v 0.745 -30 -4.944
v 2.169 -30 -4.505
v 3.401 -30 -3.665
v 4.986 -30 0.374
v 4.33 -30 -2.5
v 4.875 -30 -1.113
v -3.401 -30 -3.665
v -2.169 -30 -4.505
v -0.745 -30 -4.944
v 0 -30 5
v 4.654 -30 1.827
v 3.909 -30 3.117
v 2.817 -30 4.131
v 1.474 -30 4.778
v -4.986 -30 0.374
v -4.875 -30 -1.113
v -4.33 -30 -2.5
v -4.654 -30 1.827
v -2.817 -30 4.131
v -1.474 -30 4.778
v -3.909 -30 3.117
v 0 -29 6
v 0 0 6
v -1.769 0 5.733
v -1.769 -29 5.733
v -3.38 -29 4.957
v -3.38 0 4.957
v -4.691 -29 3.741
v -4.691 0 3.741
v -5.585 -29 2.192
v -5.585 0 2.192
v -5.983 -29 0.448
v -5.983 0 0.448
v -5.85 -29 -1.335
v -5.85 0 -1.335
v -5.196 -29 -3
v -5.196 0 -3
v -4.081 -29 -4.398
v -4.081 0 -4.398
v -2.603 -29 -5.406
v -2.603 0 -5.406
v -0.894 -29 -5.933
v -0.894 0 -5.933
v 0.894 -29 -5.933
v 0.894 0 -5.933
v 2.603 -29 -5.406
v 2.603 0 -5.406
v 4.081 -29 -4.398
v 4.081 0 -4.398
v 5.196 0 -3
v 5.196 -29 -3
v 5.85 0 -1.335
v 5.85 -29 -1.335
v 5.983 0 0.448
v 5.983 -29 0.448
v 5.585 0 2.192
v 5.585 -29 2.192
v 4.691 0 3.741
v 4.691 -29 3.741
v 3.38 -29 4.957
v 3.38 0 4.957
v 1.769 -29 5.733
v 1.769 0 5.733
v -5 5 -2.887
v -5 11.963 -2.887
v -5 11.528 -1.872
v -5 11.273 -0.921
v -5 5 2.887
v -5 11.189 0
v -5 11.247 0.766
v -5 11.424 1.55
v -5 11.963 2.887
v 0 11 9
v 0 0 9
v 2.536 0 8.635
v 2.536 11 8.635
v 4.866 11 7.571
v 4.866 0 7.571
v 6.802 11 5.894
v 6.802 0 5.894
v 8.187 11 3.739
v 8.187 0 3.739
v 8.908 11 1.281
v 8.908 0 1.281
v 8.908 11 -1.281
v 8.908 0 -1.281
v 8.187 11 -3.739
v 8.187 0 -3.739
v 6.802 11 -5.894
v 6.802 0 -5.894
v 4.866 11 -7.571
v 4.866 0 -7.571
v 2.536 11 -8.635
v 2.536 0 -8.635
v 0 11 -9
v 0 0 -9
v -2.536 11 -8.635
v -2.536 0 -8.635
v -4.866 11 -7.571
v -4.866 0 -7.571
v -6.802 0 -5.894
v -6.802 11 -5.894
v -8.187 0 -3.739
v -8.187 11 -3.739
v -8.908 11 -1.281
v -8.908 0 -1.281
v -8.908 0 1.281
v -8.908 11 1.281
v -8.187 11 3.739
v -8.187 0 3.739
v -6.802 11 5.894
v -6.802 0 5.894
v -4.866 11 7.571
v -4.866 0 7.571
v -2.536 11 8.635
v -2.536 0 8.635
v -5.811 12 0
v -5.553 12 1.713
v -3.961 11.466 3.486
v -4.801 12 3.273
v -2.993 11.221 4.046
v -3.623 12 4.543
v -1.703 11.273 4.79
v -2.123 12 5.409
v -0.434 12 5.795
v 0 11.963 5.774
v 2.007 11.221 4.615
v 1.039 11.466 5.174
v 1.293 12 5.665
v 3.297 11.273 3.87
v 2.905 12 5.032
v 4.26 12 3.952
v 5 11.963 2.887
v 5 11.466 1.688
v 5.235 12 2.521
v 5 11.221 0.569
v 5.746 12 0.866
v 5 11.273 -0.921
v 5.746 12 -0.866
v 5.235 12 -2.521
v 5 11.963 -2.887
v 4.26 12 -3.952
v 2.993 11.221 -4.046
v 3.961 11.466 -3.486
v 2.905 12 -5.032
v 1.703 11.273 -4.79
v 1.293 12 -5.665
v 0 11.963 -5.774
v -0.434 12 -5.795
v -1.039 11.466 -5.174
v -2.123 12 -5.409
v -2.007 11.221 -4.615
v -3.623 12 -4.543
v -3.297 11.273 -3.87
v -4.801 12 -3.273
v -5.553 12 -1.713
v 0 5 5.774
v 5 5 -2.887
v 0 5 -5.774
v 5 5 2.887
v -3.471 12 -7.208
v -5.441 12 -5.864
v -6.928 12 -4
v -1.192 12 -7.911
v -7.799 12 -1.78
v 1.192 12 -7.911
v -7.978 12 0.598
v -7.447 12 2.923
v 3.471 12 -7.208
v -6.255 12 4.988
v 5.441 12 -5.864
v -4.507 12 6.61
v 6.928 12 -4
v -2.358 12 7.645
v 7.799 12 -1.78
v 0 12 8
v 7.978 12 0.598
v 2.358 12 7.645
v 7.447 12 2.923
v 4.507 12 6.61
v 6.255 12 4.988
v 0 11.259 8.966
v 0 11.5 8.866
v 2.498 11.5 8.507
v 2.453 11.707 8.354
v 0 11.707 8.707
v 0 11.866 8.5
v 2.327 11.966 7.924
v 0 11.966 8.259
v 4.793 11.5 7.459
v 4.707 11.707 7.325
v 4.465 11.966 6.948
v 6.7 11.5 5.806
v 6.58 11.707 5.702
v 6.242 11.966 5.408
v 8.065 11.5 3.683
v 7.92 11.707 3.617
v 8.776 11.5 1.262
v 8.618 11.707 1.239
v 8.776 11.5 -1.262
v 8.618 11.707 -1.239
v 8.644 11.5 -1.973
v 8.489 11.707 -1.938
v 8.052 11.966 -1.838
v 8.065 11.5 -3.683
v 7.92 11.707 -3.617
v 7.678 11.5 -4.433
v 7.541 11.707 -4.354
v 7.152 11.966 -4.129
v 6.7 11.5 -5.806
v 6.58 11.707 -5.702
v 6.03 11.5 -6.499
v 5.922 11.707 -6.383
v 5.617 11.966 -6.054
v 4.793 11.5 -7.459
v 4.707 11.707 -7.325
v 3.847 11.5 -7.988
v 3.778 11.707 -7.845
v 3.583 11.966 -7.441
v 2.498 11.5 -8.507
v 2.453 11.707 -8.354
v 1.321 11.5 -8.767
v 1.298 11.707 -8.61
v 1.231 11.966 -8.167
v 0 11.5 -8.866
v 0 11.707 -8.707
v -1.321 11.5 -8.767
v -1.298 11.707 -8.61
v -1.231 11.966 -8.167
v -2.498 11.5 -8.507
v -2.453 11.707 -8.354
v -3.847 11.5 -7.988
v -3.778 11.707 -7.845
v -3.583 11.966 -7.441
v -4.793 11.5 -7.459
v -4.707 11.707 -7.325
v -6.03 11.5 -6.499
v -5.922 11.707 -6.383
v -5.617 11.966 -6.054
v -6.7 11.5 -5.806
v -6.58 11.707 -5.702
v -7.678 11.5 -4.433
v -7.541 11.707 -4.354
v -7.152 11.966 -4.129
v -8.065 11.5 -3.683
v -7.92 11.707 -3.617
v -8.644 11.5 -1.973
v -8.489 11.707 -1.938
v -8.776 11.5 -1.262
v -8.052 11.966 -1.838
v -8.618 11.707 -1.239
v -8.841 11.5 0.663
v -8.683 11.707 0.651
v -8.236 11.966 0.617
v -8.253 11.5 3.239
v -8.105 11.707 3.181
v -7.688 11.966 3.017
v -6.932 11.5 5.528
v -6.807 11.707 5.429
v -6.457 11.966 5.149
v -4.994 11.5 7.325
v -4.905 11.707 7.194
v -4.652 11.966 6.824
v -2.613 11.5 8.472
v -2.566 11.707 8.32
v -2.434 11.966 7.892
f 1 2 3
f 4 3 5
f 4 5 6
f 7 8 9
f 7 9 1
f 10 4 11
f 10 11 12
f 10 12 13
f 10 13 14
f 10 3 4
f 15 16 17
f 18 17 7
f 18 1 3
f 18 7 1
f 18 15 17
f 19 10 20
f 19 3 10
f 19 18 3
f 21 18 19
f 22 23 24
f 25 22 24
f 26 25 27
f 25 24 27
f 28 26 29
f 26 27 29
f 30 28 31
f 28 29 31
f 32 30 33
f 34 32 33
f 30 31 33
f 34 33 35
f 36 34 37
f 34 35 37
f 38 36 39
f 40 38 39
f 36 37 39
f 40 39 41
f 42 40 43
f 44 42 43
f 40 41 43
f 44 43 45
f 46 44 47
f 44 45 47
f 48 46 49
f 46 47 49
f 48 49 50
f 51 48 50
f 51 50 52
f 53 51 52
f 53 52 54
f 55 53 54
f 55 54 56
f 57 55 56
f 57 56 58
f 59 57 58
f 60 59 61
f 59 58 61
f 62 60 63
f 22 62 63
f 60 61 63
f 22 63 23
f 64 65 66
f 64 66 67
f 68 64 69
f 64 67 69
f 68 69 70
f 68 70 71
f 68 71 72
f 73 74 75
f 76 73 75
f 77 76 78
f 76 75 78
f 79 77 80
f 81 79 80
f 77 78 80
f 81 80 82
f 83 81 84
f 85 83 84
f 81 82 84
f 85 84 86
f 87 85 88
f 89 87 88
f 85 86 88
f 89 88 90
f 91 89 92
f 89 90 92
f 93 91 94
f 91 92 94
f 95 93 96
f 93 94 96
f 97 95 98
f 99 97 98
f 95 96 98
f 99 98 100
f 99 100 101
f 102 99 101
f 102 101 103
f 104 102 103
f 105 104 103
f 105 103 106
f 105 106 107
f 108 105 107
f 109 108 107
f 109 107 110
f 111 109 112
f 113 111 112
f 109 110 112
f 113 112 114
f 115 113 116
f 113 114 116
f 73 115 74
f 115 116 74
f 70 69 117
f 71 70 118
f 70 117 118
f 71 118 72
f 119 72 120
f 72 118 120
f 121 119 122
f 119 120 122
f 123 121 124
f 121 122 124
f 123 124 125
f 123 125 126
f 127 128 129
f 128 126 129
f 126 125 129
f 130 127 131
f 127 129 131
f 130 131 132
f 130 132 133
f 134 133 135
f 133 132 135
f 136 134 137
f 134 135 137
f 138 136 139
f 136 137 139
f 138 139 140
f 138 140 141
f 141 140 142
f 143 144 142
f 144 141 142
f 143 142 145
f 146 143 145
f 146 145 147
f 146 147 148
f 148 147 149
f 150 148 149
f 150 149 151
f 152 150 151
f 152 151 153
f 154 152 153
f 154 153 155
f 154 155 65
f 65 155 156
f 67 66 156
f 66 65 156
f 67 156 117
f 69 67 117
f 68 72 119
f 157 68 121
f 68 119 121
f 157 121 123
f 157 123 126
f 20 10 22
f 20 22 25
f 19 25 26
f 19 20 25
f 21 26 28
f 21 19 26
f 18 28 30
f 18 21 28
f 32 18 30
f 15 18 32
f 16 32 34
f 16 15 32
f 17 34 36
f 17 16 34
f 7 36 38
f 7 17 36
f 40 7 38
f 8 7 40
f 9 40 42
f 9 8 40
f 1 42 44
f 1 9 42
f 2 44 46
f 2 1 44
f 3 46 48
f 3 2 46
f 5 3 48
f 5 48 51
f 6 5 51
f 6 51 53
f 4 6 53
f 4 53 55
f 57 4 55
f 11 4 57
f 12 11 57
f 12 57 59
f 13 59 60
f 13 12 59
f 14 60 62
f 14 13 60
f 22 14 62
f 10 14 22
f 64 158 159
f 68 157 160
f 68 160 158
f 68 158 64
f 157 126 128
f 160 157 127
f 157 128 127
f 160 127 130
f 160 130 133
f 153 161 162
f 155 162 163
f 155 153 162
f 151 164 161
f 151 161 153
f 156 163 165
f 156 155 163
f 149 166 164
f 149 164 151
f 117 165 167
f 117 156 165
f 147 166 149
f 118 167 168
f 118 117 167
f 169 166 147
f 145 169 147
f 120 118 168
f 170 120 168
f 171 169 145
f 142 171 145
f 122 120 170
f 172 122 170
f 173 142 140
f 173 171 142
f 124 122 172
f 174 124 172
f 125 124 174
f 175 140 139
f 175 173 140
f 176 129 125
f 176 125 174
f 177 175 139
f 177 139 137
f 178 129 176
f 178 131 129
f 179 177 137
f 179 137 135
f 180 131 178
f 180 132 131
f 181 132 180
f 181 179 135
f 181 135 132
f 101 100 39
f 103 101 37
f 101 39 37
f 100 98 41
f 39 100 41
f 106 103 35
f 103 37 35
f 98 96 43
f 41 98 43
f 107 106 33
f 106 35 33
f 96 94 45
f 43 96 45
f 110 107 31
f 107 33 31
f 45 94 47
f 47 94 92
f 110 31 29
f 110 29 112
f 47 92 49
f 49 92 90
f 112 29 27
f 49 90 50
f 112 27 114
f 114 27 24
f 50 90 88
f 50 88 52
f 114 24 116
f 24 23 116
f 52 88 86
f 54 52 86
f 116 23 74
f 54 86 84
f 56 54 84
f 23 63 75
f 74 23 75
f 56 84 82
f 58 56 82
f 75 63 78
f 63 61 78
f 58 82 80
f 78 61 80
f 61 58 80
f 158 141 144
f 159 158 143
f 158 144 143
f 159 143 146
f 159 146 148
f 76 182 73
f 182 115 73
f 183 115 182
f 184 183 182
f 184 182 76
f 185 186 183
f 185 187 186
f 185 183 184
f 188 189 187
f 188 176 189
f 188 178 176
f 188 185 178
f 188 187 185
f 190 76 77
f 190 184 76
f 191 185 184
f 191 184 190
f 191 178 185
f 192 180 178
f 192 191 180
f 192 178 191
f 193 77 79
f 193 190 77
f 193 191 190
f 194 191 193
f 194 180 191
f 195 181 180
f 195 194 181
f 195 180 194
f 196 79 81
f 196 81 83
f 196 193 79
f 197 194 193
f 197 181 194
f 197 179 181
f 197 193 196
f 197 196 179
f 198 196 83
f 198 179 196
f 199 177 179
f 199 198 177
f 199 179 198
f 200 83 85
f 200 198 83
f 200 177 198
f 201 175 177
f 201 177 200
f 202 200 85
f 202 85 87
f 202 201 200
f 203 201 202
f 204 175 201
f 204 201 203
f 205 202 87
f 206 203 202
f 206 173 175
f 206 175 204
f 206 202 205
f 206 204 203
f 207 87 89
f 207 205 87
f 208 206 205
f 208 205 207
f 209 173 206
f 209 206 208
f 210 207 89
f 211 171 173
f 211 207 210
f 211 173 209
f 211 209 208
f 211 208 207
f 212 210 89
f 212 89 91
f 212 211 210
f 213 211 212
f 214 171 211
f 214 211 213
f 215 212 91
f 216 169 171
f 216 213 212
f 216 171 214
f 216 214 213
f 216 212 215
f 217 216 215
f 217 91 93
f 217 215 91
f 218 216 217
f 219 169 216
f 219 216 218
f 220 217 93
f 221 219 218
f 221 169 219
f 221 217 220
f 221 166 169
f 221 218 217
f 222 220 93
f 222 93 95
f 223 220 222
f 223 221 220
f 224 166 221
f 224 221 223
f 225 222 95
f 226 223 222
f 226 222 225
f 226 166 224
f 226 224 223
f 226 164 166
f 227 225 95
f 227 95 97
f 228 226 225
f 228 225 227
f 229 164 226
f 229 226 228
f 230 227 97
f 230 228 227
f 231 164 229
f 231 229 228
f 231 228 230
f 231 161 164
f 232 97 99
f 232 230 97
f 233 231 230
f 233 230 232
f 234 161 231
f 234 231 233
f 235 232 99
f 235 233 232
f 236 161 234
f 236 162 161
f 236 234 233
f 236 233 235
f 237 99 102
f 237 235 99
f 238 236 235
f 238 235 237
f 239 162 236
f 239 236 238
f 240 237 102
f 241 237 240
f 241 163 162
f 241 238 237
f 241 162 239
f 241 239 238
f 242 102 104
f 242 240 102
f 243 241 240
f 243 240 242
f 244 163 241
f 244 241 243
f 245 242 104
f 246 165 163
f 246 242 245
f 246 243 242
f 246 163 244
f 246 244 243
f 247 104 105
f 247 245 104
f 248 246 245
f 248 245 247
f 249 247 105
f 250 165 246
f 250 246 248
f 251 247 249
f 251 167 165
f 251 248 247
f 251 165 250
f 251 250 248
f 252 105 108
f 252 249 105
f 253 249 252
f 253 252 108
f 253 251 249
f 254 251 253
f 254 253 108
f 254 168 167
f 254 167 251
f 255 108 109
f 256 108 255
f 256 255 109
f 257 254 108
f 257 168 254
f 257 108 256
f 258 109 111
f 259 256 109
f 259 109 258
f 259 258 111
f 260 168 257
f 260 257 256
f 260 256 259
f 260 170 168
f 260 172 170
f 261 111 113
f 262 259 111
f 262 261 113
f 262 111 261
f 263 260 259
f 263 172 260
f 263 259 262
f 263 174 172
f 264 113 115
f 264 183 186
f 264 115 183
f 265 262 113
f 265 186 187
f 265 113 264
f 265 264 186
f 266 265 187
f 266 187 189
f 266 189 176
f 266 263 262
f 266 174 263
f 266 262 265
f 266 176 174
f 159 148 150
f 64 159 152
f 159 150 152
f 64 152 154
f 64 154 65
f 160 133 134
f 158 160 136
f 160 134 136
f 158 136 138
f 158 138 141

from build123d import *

# Parameters (mm, degrees)
SZKIC1_R                   = 9
WYCI_GNI_CIE1_DEPTH        = 12
SZKIC2_R                   = 6
WYCI_GNI_CIE2_DEPTH        = 30
WYTNIJ_WYCI_GNI_CIE1_DEPTH = 7
SZKIC4_R                   = 5.810938268
WYTNIJ_WYCI_GNI_CIE2_DEPTH = 2
WYTNIJ_WYCI_GNI_CIE2_DRAFT = -45
ZAOKR_GLENIE1_R            = 1
SFAZOWANIE1_SIZE           = 1


with BuildPart() as part:
    # Szkic1 → Wyciągnięcie1 (new body)
    with BuildSketch(Plane(origin=(0, 0, 0), x_dir=(1, 0, 0), z_dir=(0, 1, 0))):
        with Locations(Location((0, 0, 0), (0, 0, 270))):
            Circle(SZKIC1_R)
    extrude(amount=WYCI_GNI_CIE1_DEPTH)

    # Szkic2 → Wyciągnięcie2 (add)
    with BuildSketch(Plane.XZ):
        with Locations(Location((0, 0, 0), (0, 0, 90))):
            Circle(SZKIC2_R)
    extrude(amount=WYCI_GNI_CIE2_DEPTH)

    # Szkic3 → Wytnij-wyciągnięcie1 (cut)
    with BuildSketch(Plane(origin=(0, 12, 0), x_dir=(-1, 0, 0), z_dir=(0, 1, 0))):
        Polygon((0, 5.773502692), (-5, 2.886751346), (-5, -2.886751346), (0, -5.773502692), (5, -2.886751346), (5, 2.886751346), align=None)
    extrude(amount=-WYTNIJ_WYCI_GNI_CIE1_DEPTH, mode=Mode.SUBTRACT)


with BuildPart() as wytnij_wyci_gni_cie2_tool:
    # Szkic4 → Wytnij-wyciągnięcie2 (with draft: the straight prism first)
    with BuildSketch(Plane(origin=(0, 12, 0), x_dir=(-1, 0, 0), z_dir=(0, 1, 0))):
        Circle(SZKIC4_R)
    extrude(amount=-WYTNIJ_WYCI_GNI_CIE2_DEPTH)
    # Wytnij-wyciągnięcie2: the draft: its side faces are tilted about the plane it starts from
    wytnij_wyci_gni_cie2_sides = [wytnij_wyci_gni_cie2_tool.faces().sort_by_distance(p)[0] for p in [
        (5.810938268, 11, 0),
    ]]
    draft(wytnij_wyci_gni_cie2_sides, Plane(origin=(0, 12, 0), x_dir=(-1, 0, 0), z_dir=(0, 1, 0)), WYTNIJ_WYCI_GNI_CIE2_DRAFT)


with BuildPart() as part_1:
    add(part.part)

    # Wytnij-wyciągnięcie2: cut by wytnij_wyci_gni_cie2_tool
    add(wytnij_wyci_gni_cie2_tool.part, mode=Mode.SUBTRACT)

    # Zaokrąglenie1
    zaokr_glenie1_edges = [part_1.edges().sort_by_distance(p)[0] for p in [
        (0, 12, -9),
    ]]
    fillet(zaokr_glenie1_edges, radius=ZAOKR_GLENIE1_R)

    # Sfazowanie1
    sfazowanie1_edges = [part_1.edges().sort_by_distance(p)[0] for p in [
        (0, -30, -6),
    ]]
    chamfer(sfazowanie1_edges, length=SFAZOWANIE1_SIZE)


solid = part_1.part
